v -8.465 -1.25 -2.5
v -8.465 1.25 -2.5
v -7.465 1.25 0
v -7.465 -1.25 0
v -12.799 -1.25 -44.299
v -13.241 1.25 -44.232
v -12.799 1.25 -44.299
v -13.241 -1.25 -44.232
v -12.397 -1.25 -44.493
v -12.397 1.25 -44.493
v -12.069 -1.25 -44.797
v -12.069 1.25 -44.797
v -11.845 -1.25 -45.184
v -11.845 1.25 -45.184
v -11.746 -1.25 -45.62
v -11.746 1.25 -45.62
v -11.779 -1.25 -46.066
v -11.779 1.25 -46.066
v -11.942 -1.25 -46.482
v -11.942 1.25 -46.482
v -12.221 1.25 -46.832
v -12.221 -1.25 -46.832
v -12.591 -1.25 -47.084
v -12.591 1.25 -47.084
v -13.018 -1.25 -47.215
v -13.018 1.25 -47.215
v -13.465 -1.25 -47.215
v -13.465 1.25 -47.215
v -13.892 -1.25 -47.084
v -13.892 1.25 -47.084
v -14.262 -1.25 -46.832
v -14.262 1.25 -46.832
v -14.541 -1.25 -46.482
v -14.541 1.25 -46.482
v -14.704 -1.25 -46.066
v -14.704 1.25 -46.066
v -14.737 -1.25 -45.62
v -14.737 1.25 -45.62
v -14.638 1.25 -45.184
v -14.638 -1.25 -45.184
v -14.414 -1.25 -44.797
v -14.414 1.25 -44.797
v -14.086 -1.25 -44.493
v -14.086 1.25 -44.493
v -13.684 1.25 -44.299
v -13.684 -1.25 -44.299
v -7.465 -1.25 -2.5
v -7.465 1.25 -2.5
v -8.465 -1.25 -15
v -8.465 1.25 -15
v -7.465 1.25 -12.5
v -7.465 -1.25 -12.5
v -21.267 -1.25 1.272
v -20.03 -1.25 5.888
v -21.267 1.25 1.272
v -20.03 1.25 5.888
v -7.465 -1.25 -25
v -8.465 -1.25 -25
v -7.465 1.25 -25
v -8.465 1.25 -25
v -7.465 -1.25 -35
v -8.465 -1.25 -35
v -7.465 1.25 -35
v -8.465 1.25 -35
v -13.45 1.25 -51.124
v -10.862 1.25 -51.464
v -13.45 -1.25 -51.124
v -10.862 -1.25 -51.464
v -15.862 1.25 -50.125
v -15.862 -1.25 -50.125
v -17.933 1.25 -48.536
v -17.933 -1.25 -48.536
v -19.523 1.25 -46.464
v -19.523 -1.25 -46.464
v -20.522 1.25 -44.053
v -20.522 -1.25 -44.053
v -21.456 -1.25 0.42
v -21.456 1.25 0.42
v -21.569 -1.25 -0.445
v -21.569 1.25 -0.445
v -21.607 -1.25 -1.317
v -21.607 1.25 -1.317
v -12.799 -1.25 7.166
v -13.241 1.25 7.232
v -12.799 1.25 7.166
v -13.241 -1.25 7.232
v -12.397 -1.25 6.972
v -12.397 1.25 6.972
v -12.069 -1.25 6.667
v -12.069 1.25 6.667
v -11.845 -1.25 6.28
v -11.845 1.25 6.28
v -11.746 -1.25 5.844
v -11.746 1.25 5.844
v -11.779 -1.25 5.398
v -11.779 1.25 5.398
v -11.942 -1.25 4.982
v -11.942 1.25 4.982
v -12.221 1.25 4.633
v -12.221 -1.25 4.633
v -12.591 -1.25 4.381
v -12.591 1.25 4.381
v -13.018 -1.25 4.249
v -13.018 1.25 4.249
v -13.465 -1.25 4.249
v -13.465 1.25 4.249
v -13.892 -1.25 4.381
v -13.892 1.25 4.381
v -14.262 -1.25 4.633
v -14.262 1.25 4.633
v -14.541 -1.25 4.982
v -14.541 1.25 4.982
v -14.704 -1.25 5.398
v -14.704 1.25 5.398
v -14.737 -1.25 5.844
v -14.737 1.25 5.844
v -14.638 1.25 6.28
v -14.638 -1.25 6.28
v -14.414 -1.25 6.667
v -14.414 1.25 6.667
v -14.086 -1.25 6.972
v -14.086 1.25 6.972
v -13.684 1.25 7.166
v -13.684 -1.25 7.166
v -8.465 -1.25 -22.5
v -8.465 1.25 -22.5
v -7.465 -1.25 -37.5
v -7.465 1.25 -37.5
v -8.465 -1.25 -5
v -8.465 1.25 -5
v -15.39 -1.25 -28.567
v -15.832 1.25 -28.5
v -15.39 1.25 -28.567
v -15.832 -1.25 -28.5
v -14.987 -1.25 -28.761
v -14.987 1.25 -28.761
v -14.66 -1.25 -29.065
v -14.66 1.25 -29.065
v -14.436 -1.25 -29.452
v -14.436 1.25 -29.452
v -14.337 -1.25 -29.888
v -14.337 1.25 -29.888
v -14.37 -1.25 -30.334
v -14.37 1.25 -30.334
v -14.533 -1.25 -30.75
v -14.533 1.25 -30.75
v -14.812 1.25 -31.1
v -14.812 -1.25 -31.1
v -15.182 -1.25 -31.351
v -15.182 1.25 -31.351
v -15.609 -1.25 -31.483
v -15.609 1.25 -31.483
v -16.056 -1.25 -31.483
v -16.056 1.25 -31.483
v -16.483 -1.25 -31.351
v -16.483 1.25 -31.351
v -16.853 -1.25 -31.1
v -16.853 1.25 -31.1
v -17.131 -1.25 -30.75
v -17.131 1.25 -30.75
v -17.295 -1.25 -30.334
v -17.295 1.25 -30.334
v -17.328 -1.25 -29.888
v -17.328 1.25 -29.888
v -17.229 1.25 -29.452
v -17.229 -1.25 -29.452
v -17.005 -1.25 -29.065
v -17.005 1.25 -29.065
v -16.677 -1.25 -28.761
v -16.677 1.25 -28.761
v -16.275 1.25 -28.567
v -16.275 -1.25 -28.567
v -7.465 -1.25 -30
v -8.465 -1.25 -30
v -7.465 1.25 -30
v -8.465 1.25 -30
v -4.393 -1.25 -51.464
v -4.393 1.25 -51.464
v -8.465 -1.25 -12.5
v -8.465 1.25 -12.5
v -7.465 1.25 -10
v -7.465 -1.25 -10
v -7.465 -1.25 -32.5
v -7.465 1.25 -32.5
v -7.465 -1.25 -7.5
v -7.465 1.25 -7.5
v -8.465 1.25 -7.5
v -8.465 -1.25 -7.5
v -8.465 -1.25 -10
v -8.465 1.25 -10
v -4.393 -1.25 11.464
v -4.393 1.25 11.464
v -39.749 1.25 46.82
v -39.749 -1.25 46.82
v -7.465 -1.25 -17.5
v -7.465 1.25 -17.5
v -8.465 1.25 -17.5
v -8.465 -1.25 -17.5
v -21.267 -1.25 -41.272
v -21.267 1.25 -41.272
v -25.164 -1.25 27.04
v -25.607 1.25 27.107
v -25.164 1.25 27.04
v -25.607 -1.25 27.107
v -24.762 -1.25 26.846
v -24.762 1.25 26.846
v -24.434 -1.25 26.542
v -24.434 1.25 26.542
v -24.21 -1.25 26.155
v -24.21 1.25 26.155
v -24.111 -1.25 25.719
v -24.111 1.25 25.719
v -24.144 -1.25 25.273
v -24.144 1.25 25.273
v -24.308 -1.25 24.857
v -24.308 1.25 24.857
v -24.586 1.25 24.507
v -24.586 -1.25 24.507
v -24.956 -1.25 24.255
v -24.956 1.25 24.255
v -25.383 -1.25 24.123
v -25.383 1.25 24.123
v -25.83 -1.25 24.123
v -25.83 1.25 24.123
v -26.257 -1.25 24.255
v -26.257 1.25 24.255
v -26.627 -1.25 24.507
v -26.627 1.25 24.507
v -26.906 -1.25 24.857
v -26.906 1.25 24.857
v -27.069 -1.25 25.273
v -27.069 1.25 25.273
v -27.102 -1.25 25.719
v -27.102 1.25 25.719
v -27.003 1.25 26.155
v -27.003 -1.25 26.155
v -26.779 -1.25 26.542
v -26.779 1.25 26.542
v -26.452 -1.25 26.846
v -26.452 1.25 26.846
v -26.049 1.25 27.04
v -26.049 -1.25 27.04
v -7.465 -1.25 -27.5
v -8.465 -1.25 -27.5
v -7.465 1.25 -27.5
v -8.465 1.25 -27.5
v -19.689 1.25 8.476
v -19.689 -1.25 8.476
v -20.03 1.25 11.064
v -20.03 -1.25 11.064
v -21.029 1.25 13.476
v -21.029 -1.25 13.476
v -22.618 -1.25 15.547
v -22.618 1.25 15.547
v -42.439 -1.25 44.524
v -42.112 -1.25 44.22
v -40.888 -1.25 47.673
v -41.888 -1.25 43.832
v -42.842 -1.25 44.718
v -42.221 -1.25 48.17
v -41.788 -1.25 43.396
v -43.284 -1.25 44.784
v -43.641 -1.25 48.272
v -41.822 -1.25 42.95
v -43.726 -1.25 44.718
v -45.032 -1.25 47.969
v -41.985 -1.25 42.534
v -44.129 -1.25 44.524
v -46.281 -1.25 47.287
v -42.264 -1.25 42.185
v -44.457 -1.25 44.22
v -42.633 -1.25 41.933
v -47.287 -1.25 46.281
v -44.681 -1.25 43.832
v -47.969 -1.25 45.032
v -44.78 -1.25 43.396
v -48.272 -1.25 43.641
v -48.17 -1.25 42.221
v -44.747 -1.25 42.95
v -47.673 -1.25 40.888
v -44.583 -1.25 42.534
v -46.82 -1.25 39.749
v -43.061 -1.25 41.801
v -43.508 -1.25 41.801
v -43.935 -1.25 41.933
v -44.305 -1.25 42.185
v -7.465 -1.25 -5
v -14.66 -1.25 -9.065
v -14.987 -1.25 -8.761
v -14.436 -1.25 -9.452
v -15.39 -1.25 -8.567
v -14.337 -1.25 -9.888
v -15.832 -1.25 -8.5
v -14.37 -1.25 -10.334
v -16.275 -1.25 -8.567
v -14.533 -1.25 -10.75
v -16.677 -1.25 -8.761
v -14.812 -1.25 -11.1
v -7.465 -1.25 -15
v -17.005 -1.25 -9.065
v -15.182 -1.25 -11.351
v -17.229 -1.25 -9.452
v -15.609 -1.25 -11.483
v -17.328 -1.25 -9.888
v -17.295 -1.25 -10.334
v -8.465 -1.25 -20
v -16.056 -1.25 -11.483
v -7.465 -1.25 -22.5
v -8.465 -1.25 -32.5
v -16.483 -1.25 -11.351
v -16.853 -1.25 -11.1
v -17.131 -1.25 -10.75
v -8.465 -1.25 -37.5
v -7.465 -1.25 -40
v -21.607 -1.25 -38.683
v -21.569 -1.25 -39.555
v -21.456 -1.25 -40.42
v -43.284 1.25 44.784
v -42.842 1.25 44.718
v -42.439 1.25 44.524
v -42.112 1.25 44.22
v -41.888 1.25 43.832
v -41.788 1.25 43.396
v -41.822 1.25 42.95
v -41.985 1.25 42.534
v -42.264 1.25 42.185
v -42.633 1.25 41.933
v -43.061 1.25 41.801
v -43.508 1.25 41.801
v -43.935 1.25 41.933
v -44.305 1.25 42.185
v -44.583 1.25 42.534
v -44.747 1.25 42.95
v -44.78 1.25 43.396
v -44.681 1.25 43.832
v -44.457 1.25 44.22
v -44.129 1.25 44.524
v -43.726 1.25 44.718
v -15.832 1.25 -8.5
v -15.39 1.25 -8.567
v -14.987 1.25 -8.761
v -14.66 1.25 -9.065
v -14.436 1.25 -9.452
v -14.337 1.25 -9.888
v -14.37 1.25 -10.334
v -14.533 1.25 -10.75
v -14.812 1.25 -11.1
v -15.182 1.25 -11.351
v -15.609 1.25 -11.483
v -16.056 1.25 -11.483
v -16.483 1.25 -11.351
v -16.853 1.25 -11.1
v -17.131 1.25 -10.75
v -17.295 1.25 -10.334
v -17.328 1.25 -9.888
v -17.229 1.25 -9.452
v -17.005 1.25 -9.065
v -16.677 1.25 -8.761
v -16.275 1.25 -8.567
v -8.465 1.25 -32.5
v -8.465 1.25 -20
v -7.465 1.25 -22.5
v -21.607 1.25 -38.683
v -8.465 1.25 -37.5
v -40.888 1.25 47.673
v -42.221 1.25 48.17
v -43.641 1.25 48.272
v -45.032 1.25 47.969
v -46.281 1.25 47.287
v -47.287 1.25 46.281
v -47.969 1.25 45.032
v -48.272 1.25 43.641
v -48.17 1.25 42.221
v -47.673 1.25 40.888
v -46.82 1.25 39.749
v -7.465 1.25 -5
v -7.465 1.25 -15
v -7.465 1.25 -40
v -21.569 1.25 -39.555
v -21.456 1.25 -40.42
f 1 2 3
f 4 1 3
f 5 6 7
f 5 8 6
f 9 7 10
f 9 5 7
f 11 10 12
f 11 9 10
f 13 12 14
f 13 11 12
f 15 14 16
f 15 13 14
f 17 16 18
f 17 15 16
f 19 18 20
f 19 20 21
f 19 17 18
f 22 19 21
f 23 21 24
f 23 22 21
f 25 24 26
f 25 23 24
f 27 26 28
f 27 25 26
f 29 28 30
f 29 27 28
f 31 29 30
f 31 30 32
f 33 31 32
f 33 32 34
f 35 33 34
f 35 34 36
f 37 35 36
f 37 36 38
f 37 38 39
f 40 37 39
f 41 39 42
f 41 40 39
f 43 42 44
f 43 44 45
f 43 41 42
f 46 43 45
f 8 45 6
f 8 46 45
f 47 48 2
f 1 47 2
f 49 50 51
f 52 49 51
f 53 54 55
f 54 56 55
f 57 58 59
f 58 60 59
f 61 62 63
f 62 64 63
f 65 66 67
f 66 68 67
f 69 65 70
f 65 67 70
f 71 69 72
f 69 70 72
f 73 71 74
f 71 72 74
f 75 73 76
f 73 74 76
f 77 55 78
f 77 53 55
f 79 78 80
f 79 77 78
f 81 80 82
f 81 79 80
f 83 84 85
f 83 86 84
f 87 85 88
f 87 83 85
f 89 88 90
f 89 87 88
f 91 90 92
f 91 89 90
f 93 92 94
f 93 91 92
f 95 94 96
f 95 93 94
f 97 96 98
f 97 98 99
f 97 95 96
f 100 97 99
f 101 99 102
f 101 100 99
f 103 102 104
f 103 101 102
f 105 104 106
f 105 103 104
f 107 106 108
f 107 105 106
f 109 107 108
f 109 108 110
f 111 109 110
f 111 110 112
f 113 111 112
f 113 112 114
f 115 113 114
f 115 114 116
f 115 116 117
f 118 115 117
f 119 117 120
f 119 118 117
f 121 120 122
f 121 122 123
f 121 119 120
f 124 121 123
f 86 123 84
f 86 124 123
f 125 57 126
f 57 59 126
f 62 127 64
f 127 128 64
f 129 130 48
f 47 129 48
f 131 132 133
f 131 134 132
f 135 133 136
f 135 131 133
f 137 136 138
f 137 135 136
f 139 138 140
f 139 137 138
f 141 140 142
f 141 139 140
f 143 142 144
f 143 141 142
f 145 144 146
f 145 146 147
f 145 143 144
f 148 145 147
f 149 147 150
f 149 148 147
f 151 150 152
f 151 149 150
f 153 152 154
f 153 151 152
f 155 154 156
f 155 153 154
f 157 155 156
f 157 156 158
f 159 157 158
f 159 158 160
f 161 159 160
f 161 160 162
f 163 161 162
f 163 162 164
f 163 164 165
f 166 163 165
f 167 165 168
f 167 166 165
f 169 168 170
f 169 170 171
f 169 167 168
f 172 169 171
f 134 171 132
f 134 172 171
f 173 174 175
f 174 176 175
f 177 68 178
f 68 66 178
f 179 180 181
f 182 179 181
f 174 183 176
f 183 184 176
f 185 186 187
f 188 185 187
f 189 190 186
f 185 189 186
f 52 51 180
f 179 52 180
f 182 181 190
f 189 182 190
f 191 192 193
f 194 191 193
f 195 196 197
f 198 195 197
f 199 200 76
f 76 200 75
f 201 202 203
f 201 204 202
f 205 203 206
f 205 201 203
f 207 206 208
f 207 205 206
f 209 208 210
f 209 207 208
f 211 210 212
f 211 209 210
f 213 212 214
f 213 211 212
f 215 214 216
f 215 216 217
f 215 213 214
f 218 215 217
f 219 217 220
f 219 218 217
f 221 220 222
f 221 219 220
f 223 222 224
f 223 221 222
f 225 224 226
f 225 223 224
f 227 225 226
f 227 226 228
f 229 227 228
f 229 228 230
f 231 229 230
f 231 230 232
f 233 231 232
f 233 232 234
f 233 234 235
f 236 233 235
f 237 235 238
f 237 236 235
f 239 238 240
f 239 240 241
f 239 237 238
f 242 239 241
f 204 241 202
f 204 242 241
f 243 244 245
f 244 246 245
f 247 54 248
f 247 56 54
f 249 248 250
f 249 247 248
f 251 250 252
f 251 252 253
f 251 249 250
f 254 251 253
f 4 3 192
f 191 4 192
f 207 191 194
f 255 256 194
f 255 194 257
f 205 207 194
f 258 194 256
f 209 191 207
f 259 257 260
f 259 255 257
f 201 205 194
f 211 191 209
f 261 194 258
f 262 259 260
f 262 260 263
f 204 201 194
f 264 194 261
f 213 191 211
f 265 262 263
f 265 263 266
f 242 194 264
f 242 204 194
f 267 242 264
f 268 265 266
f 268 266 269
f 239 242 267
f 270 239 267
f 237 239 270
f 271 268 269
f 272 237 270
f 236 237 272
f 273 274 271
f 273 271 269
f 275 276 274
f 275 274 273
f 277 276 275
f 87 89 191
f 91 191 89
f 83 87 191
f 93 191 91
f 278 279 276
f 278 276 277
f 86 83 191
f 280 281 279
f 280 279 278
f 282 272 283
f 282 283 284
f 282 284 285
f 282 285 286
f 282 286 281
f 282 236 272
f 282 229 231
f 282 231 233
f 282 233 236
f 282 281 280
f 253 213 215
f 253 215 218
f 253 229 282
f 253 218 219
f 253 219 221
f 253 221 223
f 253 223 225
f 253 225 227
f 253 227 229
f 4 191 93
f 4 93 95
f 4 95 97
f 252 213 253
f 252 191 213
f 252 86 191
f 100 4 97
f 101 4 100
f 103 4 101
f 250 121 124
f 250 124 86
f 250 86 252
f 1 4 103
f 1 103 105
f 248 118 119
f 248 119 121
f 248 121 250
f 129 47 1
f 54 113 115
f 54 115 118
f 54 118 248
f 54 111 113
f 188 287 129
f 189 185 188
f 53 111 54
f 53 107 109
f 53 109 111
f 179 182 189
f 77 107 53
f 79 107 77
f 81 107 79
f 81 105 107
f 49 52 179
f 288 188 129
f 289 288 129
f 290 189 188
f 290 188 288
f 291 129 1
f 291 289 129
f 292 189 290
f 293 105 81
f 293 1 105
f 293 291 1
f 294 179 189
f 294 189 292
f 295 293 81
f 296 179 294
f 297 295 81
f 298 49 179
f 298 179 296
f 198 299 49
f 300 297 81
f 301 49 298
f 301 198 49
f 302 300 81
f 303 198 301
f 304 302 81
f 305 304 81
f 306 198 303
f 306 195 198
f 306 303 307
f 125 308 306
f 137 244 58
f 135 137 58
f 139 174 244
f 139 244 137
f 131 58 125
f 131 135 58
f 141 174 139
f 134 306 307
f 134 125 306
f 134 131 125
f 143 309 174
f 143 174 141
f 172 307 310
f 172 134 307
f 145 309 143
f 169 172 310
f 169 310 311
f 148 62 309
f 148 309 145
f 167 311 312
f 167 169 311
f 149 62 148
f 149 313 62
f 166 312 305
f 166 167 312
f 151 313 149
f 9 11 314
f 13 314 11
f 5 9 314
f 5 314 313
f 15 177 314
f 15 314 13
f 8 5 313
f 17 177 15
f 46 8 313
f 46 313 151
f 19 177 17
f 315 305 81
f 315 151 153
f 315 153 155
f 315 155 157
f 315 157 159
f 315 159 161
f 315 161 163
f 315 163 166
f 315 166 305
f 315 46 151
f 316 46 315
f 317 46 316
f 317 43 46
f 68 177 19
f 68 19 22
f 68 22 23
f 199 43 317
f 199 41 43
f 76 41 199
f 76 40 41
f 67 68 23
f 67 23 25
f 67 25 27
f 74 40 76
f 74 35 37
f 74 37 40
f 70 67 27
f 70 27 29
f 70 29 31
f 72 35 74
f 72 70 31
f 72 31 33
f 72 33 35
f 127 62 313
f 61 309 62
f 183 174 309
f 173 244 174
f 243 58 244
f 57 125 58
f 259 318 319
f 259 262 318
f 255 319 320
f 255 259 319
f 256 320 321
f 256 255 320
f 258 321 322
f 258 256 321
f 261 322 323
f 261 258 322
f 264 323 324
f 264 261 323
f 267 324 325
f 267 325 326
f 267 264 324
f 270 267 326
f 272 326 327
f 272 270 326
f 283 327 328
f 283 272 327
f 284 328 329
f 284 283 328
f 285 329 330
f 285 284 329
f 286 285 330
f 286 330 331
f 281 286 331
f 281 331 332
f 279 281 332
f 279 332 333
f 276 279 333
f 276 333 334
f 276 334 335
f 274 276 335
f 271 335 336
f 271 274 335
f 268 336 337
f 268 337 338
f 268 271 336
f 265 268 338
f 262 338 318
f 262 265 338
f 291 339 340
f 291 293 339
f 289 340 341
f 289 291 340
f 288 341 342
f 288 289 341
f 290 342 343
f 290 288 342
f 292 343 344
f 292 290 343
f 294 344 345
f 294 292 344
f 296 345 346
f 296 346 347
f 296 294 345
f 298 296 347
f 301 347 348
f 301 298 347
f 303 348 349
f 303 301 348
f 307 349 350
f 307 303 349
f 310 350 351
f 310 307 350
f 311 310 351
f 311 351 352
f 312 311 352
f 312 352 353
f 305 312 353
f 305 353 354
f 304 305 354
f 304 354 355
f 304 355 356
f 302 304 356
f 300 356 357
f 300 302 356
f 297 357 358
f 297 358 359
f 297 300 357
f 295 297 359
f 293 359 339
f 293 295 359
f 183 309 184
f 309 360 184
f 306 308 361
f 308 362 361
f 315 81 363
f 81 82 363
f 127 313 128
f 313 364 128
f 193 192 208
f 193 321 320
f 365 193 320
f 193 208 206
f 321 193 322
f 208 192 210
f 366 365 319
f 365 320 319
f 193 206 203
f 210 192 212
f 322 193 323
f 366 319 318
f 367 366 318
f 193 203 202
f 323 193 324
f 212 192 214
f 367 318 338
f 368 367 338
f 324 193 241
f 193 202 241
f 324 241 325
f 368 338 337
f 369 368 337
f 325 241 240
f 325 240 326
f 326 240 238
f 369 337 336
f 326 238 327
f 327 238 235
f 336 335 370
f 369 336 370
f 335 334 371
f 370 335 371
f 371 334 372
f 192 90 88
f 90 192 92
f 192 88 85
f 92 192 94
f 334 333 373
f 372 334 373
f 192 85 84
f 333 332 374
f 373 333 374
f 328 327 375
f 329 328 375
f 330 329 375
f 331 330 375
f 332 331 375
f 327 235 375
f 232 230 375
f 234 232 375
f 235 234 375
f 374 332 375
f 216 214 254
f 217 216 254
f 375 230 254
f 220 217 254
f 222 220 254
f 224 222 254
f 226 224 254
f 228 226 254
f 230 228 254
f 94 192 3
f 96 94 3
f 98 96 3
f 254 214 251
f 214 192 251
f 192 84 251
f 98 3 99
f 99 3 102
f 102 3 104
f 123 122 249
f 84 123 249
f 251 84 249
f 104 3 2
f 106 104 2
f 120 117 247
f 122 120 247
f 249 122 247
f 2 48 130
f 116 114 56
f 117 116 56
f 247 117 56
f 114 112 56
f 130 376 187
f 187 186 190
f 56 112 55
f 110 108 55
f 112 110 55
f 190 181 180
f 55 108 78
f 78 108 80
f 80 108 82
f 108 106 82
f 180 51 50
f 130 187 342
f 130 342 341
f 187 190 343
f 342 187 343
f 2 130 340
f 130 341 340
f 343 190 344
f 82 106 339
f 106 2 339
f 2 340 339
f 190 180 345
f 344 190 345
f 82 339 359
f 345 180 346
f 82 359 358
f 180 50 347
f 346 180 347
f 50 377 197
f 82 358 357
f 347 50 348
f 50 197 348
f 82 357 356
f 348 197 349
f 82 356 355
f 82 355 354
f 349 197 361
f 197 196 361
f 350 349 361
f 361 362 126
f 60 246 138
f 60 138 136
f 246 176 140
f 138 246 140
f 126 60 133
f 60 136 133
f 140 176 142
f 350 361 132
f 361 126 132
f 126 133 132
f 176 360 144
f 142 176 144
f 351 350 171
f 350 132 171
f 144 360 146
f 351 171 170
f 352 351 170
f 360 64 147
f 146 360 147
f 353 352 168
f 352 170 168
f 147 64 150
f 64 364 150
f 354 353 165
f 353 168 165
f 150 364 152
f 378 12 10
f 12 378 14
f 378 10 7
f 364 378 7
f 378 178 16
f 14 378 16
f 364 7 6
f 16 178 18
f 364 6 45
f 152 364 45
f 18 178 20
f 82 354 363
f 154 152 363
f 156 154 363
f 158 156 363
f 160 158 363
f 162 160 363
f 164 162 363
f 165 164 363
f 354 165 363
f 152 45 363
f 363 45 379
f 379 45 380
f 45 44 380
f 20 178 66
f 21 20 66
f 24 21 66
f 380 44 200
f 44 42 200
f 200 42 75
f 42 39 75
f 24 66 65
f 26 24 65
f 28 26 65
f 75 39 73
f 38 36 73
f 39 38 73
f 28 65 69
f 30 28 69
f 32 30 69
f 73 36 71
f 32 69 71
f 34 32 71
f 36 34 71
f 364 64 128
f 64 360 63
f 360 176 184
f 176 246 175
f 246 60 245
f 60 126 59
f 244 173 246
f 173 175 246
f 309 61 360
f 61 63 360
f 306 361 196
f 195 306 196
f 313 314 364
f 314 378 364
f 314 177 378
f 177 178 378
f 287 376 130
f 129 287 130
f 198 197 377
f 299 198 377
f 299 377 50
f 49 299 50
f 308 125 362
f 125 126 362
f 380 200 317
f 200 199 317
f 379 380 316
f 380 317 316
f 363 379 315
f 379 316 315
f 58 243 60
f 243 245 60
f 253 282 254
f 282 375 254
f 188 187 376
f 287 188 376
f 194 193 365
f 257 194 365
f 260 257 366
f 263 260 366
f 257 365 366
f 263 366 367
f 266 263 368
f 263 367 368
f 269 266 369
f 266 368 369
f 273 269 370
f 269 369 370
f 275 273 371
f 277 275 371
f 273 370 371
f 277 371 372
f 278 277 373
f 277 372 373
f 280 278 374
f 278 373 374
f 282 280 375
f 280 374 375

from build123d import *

# Parameters (mm, degrees)
SKETCH1_R           = 1.5
BOSS_EXTRUDE1_DEPTH = 1.25
FILLET2_R           = 10


with BuildPart() as part:
    # Sketch1 → Boss-Extrude1 (new, symmetric)
    with BuildSketch(Plane(origin=(0, 0, 0), x_dir=(1, 0, 0), z_dir=(0, 1, 0))):
        with BuildLine():
            Line((-39.748737342, -46.819805153), (-4.393398282, -11.464466094))
            Line((-4.393398282, -11.464466094), (-7.465292714, 0))
            Line((-7.465292714, 0), (-8.465292714, 2.5))
            Line((-8.465292714, 2.5), (-7.465292714, 2.5))
            Line((-7.465292714, 2.5), (-8.465292714, 5))
            Line((-8.465292714, 5), (-7.465292714, 5))
            Line((-7.465292714, 5), (-8.465292714, 7.5))
            Line((-8.465292714, 7.5), (-7.465292714, 7.5))
            Line((-7.465292714, 7.5), (-8.465292714, 10))
            Line((-8.465292714, 10), (-7.465292714, 10))
            Line((-7.465292714, 10), (-8.465292714, 12.5))
            Line((-8.465292714, 12.5), (-7.465292714, 12.5))
            Line((-7.465292714, 12.5), (-8.465292714, 15))
            Line((-8.465292714, 15), (-7.465292714, 15))
            Line((-7.465292714, 15), (-8.465292714, 17.5))
            Line((-8.465292714, 17.5), (-7.465292714, 17.5))
            Line((-7.465292714, 17.5), (-8.465292714, 20))
            Line((-8.465292714, 20), (-7.465292714, 22.5))
            Line((-7.465292714, 22.5), (-8.465292714, 22.5))
            Line((-8.465292714, 22.5), (-7.465292714, 25))
            Line((-7.465292714, 25), (-8.465292714, 25))
            Line((-8.465292714, 25), (-7.465292714, 27.5))
            Line((-7.465292714, 27.5), (-8.465292714, 27.5))
            Line((-8.465292714, 27.5), (-7.465292714, 30))
            Line((-7.465292714, 30), (-8.465292714, 30))
            Line((-8.465292714, 30), (-7.465292714, 32.5))
            Line((-7.465292714, 32.5), (-8.465292714, 32.5))
            Line((-8.465292714, 32.5), (-7.465292714, 35))
            Line((-7.465292714, 35), (-8.465292714, 35))
            Line((-8.465292714, 35), (-7.465292714, 37.5))
            Line((-7.465292714, 37.5), (-8.465292714, 37.5))
            Line((-8.465292714, 37.5), (-7.465292714, 40))
            Line((-7.465292714, 40), (-4.393398282, 51.464466094))
            Line((-4.393398282, 51.464466094), (-18.535533906, 51.464466094))
            Line((-18.535533906, 51.464466094), (-21.607428337, 40))
            Line((-21.607428337, 40), (-21.607428337, 0))
            Line((-21.607428337, 0), (-18.535533906, -11.464466094))
            Line((-18.535533906, -11.464466094), (-46.819805153, -39.748737342))
            ThreePointArc((-46.819805153, -39.748737342), (-46.819805153, -46.819805153), (-39.748737342, -46.819805153))
        make_face()
        with Locations((-43.284271247, -43.284271247)):
            Circle(SKETCH1_R, mode=Mode.SUBTRACT)
        with Locations((-25.606601718, -25.606601718)):
            Circle(SKETCH1_R, mode=Mode.SUBTRACT)
        with Locations((-13.241481122, 45.732233047)):
            Circle(SKETCH1_R, mode=Mode.SUBTRACT)
        with Locations((-13.241481122, -5.732233047)):
            Circle(SKETCH1_R, mode=Mode.SUBTRACT)
        with Locations((-15.832428337, 10)):
            Circle(SKETCH1_R, mode=Mode.SUBTRACT)
        with Locations((-15.832428337, 30)):
            Circle(SKETCH1_R, mode=Mode.SUBTRACT)
    extrude(amount=BOSS_EXTRUDE1_DEPTH, both=True)

    # Fillet2
    fillet2_edges = [part.edges().sort_by_distance(p)[0] for p in [
        (-18.535533906, 0, 11.464466094),
        (-21.607428337, 0, 0),
        (-21.607428337, 0, -40),
        (-18.535533906, 0, -51.464466094),
    ]]
    fillet(fillet2_edges, radius=FILLET2_R)


solid = part.part
